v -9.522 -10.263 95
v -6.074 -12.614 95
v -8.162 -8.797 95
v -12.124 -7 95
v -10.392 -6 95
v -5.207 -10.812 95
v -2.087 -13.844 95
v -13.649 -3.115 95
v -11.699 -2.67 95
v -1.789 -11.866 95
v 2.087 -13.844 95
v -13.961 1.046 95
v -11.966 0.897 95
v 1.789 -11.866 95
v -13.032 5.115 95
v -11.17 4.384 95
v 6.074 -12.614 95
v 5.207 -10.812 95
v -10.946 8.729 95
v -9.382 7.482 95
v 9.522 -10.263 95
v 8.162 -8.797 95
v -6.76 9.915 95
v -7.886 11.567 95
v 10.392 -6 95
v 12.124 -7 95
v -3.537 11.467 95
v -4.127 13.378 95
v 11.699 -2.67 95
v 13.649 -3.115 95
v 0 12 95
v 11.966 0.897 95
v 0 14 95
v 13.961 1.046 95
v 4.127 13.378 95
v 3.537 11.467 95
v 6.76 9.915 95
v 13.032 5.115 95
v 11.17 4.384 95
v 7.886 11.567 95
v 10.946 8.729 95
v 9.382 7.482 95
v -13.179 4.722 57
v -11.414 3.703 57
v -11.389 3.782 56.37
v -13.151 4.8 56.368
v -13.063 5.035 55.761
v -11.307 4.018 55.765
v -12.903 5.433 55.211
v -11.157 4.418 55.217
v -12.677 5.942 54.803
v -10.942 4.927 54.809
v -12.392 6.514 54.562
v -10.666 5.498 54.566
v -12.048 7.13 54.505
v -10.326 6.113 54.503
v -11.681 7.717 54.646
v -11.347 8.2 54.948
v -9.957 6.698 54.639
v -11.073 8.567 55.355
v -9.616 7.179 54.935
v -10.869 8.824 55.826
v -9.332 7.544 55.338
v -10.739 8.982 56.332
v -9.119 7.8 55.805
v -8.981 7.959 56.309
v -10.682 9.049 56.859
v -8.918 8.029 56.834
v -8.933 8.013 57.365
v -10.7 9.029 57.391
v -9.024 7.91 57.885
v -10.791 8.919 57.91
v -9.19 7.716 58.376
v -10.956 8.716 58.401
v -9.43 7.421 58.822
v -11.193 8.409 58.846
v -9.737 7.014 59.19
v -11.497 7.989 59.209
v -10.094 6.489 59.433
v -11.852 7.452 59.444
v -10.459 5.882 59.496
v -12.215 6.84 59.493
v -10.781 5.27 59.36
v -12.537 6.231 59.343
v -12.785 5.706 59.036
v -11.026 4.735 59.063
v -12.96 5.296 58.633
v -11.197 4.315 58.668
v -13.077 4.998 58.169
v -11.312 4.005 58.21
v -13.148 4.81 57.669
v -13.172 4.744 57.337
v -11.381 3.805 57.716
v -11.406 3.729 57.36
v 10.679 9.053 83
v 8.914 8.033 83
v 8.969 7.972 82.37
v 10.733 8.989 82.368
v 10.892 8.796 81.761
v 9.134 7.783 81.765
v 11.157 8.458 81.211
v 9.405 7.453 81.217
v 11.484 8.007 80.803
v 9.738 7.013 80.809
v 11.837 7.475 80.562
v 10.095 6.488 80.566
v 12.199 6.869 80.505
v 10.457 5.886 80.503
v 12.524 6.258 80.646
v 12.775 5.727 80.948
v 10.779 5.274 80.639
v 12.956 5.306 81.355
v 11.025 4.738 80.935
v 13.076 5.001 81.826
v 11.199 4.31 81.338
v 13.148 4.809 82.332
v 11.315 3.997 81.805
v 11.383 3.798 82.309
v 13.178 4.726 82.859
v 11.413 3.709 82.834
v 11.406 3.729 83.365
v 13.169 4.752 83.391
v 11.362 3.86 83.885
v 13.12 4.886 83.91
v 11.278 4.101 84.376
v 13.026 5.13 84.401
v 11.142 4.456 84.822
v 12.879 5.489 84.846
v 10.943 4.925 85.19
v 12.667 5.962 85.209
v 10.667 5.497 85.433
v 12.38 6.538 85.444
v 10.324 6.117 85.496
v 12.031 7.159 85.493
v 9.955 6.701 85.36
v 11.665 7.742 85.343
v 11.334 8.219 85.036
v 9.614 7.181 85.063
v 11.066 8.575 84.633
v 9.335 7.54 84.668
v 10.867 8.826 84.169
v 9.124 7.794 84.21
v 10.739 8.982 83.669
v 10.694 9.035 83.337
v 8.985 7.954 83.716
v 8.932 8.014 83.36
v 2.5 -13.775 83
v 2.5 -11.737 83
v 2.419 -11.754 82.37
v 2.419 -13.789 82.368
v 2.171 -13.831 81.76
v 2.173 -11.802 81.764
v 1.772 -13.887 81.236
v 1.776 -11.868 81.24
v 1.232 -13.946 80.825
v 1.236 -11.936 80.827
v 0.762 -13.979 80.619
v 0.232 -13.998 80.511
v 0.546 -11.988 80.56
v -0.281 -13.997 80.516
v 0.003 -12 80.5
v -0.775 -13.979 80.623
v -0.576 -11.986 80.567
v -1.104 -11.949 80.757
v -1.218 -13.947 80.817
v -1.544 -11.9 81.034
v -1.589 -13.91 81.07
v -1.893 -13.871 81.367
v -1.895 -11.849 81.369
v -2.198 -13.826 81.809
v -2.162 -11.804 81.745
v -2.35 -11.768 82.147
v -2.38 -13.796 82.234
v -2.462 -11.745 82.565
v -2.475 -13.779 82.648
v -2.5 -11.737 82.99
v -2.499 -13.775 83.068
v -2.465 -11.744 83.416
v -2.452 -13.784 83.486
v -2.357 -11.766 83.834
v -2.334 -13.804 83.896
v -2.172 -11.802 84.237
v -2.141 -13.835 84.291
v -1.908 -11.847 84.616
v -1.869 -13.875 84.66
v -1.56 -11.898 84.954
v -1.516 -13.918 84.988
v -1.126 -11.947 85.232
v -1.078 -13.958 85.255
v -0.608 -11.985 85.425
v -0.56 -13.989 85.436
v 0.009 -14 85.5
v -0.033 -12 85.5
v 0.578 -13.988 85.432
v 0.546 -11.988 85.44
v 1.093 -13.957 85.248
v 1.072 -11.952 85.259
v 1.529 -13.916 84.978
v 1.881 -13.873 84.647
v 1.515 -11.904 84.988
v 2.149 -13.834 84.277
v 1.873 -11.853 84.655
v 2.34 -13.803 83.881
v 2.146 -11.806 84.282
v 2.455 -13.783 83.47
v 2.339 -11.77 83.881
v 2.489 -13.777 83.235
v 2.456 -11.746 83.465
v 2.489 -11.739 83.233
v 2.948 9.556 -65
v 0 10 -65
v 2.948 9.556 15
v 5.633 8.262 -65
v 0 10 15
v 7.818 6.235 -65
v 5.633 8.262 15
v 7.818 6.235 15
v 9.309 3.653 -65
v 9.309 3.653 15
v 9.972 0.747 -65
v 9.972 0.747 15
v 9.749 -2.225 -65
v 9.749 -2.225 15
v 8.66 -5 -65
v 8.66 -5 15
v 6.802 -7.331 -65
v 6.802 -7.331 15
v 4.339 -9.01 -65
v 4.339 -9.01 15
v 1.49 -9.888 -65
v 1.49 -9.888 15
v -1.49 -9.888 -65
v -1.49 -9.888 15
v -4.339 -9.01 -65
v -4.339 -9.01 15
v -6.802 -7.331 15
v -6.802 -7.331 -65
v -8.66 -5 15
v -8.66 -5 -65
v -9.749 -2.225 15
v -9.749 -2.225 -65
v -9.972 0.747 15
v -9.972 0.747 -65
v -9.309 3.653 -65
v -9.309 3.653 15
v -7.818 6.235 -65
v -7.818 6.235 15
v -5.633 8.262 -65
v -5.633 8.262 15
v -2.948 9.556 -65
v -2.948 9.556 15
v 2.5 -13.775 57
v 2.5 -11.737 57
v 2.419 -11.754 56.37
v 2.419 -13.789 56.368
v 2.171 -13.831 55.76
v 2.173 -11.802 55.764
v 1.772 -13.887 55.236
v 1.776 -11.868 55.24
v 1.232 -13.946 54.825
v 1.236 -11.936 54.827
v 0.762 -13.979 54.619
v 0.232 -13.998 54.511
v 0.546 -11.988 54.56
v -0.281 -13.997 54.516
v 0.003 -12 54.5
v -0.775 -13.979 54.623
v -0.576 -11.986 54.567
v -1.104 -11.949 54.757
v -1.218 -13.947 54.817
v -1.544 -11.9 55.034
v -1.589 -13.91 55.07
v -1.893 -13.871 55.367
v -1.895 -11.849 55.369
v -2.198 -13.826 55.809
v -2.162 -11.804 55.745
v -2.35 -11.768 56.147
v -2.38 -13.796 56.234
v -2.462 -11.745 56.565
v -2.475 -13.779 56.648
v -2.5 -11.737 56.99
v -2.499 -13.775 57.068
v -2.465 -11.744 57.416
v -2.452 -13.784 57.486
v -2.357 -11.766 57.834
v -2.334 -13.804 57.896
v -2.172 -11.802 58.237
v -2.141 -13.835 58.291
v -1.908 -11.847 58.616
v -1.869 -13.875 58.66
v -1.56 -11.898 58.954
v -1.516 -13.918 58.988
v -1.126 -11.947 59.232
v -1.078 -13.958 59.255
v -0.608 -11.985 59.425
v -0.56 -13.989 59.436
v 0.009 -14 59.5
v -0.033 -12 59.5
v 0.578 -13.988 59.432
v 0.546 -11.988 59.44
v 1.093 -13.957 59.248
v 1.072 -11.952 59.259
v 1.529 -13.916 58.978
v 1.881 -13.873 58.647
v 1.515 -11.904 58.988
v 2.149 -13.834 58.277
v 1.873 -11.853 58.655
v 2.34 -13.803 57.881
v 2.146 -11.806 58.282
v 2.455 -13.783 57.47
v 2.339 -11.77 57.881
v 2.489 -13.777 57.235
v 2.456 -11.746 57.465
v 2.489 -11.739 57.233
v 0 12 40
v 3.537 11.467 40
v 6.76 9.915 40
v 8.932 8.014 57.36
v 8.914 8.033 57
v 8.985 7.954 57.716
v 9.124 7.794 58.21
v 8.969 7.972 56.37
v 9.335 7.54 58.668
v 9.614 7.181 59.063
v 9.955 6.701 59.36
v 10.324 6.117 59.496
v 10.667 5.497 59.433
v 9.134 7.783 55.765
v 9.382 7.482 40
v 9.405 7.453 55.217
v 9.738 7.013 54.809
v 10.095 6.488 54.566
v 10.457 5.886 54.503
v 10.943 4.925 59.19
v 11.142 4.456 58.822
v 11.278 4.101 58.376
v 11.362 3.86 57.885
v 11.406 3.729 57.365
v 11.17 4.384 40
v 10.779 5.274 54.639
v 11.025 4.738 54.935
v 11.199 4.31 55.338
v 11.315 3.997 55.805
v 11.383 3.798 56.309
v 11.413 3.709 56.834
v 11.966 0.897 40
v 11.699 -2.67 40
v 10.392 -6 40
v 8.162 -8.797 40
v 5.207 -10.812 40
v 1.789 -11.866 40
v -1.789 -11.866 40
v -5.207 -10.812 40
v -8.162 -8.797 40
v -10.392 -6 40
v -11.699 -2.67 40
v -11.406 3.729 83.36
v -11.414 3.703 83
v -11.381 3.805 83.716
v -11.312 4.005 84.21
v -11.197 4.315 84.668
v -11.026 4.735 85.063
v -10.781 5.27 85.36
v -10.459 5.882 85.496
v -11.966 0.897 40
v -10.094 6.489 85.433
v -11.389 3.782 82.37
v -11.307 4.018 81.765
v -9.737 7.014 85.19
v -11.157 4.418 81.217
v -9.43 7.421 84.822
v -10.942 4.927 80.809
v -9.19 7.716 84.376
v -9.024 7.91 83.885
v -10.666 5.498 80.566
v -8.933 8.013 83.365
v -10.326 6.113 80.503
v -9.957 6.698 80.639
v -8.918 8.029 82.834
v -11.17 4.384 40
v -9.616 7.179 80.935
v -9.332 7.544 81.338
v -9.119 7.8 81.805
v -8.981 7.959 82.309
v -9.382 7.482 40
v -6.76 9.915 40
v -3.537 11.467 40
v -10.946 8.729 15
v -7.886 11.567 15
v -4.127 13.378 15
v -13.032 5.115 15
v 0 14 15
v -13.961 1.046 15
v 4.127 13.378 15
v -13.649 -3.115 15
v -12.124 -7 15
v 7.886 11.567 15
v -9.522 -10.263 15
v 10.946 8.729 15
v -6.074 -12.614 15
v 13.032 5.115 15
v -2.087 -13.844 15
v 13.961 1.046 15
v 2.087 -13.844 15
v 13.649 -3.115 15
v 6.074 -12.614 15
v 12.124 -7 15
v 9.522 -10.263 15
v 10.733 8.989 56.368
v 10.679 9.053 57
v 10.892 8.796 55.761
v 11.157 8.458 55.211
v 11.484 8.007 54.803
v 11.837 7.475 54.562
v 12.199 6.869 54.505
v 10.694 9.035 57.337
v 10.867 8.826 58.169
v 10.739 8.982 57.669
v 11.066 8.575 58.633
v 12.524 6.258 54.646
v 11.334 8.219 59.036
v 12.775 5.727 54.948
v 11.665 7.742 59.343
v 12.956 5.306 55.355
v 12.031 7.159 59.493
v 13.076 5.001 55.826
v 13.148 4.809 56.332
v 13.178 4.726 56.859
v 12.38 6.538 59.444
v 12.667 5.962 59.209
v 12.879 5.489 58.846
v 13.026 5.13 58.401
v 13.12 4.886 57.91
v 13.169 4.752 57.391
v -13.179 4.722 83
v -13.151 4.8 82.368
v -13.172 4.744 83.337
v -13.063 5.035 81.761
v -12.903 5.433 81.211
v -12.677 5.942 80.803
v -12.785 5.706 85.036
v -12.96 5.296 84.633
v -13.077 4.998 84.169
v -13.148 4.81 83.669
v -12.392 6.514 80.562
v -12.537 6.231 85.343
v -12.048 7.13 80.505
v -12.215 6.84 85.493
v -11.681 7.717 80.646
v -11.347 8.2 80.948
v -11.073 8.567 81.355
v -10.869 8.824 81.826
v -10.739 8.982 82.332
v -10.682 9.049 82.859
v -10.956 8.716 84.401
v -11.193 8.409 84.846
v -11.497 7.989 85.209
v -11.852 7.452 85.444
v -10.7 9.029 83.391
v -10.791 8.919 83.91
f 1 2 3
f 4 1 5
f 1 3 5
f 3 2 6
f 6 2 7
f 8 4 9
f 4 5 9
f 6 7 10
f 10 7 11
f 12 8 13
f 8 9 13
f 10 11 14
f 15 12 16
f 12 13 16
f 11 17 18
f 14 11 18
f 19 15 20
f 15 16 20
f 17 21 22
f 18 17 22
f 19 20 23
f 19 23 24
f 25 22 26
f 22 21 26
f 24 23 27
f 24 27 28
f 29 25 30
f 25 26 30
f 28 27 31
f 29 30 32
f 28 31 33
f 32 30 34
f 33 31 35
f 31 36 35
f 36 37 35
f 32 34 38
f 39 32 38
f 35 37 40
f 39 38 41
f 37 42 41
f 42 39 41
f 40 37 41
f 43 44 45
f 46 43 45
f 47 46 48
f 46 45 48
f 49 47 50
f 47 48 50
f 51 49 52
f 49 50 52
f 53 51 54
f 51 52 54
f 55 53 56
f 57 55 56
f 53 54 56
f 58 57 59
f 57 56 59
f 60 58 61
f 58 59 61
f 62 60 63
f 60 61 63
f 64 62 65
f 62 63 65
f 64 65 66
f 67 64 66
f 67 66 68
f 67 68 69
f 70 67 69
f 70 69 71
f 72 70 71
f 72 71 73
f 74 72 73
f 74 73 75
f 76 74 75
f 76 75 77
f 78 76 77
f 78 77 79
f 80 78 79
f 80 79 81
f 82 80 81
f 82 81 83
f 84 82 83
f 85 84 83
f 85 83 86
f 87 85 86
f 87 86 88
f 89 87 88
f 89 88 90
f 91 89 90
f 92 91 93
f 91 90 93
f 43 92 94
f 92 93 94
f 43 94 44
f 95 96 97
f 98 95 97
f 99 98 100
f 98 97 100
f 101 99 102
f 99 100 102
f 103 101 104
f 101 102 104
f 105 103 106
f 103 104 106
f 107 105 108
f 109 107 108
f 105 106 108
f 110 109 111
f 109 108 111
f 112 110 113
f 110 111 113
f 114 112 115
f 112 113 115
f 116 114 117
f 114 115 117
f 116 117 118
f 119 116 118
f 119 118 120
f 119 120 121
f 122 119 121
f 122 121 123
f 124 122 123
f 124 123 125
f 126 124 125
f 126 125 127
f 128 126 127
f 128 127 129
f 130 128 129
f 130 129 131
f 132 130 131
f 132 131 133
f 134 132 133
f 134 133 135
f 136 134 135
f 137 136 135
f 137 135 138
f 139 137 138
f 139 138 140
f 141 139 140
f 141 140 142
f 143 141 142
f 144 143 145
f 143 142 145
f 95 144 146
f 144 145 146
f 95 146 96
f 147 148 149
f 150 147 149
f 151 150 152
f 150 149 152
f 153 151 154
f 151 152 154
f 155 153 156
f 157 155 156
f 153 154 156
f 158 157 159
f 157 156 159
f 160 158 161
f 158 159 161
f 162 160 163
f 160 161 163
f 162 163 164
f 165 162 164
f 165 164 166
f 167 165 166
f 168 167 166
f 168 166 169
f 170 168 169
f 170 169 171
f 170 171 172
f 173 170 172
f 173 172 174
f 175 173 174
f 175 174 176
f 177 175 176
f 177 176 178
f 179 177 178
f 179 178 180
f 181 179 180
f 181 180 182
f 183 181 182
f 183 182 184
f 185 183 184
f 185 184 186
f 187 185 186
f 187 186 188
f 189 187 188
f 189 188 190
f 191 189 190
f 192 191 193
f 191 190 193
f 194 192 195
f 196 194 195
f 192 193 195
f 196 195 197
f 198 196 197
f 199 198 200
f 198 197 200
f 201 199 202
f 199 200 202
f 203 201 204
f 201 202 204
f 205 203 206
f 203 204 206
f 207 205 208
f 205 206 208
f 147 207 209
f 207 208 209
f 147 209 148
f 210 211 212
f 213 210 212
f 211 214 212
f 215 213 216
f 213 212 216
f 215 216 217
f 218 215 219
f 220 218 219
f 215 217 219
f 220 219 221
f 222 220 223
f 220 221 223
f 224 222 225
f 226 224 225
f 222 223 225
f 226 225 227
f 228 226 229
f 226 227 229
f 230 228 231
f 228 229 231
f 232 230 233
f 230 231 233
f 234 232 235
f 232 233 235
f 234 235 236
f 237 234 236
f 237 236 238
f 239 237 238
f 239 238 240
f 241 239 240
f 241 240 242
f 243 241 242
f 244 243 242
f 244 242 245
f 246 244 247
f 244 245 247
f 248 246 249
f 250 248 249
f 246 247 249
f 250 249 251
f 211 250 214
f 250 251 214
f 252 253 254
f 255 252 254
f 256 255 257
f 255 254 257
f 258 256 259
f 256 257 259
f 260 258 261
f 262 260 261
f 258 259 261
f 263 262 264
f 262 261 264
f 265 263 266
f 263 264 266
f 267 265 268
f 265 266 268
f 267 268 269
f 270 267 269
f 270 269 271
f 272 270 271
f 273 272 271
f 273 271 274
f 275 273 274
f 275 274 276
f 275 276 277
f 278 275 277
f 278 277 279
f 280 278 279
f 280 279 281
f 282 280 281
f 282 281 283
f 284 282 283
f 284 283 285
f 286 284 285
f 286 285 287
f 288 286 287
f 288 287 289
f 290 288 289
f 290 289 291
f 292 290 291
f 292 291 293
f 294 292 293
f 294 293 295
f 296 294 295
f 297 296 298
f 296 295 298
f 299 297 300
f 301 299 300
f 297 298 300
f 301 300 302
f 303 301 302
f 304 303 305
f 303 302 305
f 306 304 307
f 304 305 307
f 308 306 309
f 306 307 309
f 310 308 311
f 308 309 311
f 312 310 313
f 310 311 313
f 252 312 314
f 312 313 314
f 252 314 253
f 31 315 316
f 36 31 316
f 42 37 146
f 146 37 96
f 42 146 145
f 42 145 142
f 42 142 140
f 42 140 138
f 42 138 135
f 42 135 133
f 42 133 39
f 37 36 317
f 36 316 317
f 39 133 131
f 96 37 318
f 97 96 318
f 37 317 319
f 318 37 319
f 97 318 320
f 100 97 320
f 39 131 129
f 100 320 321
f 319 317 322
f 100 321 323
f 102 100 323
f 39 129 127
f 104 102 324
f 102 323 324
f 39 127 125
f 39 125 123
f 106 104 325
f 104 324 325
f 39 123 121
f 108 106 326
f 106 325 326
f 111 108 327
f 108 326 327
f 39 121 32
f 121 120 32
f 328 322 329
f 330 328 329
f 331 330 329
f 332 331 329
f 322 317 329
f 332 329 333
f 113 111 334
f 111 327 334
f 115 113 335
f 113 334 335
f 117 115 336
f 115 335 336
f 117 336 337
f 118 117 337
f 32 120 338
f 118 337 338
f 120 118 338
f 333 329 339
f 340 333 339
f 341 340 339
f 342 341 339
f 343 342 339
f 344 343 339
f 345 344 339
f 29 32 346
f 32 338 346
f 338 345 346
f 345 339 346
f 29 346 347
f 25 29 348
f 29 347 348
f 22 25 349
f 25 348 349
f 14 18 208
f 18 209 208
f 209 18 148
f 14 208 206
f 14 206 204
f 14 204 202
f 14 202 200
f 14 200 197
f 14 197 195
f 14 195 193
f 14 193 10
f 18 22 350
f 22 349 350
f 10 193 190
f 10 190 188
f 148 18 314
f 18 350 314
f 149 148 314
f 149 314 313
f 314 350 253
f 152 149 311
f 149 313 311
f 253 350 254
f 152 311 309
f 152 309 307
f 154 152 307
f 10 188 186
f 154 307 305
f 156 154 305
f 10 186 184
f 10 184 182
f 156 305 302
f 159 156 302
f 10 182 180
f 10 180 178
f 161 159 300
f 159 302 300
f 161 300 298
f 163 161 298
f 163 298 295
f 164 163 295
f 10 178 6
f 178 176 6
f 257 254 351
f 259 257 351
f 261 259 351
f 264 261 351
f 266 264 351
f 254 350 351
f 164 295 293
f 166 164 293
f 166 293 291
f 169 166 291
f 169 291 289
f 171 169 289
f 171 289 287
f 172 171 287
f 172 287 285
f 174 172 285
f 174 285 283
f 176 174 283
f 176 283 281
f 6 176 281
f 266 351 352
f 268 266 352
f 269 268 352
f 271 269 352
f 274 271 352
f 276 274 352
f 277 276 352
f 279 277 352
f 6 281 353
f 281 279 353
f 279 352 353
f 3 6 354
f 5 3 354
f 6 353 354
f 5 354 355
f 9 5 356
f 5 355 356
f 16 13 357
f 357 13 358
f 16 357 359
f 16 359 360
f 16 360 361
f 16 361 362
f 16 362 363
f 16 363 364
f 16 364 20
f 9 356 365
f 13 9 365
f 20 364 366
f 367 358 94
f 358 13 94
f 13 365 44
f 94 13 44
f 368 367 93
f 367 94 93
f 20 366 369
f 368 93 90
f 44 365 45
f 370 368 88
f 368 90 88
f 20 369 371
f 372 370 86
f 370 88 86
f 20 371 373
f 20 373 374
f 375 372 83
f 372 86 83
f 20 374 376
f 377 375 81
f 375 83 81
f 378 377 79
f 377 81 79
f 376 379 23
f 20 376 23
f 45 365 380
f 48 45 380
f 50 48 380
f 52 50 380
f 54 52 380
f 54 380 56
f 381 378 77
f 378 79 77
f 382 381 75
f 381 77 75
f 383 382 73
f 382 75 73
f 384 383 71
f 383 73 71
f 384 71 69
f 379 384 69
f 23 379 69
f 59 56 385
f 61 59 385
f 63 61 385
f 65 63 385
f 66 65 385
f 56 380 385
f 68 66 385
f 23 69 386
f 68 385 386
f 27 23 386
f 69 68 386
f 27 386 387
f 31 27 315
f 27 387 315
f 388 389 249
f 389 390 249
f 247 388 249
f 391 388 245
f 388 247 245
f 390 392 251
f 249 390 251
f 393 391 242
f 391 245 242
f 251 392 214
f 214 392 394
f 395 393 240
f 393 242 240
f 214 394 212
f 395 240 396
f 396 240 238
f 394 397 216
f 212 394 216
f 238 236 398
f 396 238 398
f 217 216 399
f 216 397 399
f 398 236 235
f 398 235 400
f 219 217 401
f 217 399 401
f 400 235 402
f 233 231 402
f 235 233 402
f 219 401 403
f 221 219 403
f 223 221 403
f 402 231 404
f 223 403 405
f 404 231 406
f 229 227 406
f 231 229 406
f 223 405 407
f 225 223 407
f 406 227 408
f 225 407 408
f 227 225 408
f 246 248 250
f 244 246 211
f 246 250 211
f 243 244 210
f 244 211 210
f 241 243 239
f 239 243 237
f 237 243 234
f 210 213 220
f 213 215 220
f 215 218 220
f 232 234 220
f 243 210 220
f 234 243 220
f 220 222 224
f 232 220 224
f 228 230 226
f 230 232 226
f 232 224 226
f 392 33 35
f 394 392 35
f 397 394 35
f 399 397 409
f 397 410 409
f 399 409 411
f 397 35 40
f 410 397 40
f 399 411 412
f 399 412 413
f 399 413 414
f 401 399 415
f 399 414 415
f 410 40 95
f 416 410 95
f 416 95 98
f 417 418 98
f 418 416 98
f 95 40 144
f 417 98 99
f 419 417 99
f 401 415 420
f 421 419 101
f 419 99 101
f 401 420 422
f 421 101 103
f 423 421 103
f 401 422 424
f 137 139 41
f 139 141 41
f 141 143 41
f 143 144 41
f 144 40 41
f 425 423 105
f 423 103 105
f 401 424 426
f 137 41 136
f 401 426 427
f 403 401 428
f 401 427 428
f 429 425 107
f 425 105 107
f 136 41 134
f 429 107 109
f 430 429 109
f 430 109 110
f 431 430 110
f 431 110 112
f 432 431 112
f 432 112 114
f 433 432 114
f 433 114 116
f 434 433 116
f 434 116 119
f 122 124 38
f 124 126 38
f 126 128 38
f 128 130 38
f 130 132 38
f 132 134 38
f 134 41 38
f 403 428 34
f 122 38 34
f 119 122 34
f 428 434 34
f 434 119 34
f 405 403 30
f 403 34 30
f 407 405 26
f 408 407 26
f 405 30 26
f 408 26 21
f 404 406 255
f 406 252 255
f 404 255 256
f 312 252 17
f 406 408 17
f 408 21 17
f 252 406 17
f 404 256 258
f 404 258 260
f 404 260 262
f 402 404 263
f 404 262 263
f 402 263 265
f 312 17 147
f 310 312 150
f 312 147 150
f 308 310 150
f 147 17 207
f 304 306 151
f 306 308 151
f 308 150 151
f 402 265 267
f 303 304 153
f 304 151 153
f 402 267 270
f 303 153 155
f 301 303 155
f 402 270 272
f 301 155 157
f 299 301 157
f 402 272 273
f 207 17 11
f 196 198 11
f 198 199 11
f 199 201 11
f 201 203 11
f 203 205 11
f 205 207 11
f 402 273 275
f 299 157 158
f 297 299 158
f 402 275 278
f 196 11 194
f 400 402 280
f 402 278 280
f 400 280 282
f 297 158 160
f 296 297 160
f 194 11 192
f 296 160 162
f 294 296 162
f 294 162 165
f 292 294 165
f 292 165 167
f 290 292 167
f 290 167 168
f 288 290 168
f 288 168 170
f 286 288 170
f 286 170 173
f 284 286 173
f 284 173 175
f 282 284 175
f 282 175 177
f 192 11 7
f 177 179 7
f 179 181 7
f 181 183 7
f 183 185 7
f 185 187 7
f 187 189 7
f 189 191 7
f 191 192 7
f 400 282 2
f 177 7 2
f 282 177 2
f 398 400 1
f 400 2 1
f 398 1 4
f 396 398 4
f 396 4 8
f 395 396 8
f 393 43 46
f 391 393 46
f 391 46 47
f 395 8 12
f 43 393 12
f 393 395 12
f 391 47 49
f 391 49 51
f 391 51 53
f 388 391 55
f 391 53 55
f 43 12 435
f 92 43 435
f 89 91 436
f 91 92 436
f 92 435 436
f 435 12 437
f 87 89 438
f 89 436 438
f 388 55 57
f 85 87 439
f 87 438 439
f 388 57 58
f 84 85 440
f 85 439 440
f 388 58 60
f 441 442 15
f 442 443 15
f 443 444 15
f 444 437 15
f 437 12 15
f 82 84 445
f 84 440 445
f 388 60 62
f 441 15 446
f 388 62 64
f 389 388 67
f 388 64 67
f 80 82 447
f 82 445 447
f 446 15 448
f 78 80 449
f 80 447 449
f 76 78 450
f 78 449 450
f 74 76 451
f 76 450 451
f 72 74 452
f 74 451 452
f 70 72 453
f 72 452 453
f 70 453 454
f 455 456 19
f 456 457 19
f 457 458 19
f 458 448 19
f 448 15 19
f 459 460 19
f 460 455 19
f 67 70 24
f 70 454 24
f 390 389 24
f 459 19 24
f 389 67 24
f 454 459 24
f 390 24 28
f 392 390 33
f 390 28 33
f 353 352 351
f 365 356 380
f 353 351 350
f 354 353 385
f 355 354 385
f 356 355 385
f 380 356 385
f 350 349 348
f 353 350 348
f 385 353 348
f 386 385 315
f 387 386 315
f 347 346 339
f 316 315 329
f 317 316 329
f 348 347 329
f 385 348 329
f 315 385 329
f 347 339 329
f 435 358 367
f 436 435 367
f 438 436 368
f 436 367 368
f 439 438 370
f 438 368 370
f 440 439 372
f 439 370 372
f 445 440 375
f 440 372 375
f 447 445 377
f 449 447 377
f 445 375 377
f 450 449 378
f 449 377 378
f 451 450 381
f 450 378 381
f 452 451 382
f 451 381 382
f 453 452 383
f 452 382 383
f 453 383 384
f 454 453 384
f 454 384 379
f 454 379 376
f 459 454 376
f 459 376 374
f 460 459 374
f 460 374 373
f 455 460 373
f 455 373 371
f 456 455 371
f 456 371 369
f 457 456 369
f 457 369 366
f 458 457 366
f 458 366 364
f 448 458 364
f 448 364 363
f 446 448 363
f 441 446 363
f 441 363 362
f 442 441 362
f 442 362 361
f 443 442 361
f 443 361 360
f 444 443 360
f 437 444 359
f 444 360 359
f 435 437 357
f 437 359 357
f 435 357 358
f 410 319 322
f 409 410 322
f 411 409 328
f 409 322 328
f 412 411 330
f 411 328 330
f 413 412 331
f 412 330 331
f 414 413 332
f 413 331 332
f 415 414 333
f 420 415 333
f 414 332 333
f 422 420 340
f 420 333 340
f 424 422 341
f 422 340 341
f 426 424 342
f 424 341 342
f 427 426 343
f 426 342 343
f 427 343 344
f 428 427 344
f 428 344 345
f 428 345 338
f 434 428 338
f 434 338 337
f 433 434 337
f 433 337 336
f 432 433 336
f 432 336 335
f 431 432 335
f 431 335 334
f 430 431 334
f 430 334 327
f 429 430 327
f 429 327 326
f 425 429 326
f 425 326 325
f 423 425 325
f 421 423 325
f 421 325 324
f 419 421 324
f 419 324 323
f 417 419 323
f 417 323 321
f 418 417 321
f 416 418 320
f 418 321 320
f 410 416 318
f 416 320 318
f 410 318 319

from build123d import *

# Parameters (mm, degrees)
CROQUIS2_R            = 2.5
CORTAR_EXTRUIR1_DEPTH = 15
MATRIZC1_COUNT        = 3


with BuildPart() as part:
    # Croquis1 → Revolución1 (revolve)
    with BuildSketch(Plane(origin=(0, 0, 0), x_dir=(0, 0, -1), z_dir=(1, 0, 0))):
        Polygon((-95, 14), (-95, 12), (-40, 12), (-40, 0), (65, 0), (65, 10), (-15, 10), (-15, 14), align=None)
    revolve(axis=Axis((0, 0, 144.04817275), (0, 0, -1)))

    # Croquis2 → Cortar-Extruir1 (cut)
    with BuildSketch(Plane(origin=(0, 0, 0), x_dir=(1, 0, 0), z_dir=(0, 1, 0))):
        with Locations((0, -83)):
            Circle(CROQUIS2_R)
        with Locations((0, -57)):
            Circle(CROQUIS2_R)
    cortar_extruir1 = extrude(amount=-CORTAR_EXTRUIR1_DEPTH, mode=Mode.SUBTRACT)

    # MatrizC1: Cortar-Extruir1 ×3 about axis
    matrizc1_axis = Axis((0, 0, 103), (0, 0, -1))
    for i in range(1, MATRIZC1_COUNT):
        add(cortar_extruir1.rotate(matrizc1_axis, i * 360 / MATRIZC1_COUNT), mode=Mode.SUBTRACT)


solid = part.part
